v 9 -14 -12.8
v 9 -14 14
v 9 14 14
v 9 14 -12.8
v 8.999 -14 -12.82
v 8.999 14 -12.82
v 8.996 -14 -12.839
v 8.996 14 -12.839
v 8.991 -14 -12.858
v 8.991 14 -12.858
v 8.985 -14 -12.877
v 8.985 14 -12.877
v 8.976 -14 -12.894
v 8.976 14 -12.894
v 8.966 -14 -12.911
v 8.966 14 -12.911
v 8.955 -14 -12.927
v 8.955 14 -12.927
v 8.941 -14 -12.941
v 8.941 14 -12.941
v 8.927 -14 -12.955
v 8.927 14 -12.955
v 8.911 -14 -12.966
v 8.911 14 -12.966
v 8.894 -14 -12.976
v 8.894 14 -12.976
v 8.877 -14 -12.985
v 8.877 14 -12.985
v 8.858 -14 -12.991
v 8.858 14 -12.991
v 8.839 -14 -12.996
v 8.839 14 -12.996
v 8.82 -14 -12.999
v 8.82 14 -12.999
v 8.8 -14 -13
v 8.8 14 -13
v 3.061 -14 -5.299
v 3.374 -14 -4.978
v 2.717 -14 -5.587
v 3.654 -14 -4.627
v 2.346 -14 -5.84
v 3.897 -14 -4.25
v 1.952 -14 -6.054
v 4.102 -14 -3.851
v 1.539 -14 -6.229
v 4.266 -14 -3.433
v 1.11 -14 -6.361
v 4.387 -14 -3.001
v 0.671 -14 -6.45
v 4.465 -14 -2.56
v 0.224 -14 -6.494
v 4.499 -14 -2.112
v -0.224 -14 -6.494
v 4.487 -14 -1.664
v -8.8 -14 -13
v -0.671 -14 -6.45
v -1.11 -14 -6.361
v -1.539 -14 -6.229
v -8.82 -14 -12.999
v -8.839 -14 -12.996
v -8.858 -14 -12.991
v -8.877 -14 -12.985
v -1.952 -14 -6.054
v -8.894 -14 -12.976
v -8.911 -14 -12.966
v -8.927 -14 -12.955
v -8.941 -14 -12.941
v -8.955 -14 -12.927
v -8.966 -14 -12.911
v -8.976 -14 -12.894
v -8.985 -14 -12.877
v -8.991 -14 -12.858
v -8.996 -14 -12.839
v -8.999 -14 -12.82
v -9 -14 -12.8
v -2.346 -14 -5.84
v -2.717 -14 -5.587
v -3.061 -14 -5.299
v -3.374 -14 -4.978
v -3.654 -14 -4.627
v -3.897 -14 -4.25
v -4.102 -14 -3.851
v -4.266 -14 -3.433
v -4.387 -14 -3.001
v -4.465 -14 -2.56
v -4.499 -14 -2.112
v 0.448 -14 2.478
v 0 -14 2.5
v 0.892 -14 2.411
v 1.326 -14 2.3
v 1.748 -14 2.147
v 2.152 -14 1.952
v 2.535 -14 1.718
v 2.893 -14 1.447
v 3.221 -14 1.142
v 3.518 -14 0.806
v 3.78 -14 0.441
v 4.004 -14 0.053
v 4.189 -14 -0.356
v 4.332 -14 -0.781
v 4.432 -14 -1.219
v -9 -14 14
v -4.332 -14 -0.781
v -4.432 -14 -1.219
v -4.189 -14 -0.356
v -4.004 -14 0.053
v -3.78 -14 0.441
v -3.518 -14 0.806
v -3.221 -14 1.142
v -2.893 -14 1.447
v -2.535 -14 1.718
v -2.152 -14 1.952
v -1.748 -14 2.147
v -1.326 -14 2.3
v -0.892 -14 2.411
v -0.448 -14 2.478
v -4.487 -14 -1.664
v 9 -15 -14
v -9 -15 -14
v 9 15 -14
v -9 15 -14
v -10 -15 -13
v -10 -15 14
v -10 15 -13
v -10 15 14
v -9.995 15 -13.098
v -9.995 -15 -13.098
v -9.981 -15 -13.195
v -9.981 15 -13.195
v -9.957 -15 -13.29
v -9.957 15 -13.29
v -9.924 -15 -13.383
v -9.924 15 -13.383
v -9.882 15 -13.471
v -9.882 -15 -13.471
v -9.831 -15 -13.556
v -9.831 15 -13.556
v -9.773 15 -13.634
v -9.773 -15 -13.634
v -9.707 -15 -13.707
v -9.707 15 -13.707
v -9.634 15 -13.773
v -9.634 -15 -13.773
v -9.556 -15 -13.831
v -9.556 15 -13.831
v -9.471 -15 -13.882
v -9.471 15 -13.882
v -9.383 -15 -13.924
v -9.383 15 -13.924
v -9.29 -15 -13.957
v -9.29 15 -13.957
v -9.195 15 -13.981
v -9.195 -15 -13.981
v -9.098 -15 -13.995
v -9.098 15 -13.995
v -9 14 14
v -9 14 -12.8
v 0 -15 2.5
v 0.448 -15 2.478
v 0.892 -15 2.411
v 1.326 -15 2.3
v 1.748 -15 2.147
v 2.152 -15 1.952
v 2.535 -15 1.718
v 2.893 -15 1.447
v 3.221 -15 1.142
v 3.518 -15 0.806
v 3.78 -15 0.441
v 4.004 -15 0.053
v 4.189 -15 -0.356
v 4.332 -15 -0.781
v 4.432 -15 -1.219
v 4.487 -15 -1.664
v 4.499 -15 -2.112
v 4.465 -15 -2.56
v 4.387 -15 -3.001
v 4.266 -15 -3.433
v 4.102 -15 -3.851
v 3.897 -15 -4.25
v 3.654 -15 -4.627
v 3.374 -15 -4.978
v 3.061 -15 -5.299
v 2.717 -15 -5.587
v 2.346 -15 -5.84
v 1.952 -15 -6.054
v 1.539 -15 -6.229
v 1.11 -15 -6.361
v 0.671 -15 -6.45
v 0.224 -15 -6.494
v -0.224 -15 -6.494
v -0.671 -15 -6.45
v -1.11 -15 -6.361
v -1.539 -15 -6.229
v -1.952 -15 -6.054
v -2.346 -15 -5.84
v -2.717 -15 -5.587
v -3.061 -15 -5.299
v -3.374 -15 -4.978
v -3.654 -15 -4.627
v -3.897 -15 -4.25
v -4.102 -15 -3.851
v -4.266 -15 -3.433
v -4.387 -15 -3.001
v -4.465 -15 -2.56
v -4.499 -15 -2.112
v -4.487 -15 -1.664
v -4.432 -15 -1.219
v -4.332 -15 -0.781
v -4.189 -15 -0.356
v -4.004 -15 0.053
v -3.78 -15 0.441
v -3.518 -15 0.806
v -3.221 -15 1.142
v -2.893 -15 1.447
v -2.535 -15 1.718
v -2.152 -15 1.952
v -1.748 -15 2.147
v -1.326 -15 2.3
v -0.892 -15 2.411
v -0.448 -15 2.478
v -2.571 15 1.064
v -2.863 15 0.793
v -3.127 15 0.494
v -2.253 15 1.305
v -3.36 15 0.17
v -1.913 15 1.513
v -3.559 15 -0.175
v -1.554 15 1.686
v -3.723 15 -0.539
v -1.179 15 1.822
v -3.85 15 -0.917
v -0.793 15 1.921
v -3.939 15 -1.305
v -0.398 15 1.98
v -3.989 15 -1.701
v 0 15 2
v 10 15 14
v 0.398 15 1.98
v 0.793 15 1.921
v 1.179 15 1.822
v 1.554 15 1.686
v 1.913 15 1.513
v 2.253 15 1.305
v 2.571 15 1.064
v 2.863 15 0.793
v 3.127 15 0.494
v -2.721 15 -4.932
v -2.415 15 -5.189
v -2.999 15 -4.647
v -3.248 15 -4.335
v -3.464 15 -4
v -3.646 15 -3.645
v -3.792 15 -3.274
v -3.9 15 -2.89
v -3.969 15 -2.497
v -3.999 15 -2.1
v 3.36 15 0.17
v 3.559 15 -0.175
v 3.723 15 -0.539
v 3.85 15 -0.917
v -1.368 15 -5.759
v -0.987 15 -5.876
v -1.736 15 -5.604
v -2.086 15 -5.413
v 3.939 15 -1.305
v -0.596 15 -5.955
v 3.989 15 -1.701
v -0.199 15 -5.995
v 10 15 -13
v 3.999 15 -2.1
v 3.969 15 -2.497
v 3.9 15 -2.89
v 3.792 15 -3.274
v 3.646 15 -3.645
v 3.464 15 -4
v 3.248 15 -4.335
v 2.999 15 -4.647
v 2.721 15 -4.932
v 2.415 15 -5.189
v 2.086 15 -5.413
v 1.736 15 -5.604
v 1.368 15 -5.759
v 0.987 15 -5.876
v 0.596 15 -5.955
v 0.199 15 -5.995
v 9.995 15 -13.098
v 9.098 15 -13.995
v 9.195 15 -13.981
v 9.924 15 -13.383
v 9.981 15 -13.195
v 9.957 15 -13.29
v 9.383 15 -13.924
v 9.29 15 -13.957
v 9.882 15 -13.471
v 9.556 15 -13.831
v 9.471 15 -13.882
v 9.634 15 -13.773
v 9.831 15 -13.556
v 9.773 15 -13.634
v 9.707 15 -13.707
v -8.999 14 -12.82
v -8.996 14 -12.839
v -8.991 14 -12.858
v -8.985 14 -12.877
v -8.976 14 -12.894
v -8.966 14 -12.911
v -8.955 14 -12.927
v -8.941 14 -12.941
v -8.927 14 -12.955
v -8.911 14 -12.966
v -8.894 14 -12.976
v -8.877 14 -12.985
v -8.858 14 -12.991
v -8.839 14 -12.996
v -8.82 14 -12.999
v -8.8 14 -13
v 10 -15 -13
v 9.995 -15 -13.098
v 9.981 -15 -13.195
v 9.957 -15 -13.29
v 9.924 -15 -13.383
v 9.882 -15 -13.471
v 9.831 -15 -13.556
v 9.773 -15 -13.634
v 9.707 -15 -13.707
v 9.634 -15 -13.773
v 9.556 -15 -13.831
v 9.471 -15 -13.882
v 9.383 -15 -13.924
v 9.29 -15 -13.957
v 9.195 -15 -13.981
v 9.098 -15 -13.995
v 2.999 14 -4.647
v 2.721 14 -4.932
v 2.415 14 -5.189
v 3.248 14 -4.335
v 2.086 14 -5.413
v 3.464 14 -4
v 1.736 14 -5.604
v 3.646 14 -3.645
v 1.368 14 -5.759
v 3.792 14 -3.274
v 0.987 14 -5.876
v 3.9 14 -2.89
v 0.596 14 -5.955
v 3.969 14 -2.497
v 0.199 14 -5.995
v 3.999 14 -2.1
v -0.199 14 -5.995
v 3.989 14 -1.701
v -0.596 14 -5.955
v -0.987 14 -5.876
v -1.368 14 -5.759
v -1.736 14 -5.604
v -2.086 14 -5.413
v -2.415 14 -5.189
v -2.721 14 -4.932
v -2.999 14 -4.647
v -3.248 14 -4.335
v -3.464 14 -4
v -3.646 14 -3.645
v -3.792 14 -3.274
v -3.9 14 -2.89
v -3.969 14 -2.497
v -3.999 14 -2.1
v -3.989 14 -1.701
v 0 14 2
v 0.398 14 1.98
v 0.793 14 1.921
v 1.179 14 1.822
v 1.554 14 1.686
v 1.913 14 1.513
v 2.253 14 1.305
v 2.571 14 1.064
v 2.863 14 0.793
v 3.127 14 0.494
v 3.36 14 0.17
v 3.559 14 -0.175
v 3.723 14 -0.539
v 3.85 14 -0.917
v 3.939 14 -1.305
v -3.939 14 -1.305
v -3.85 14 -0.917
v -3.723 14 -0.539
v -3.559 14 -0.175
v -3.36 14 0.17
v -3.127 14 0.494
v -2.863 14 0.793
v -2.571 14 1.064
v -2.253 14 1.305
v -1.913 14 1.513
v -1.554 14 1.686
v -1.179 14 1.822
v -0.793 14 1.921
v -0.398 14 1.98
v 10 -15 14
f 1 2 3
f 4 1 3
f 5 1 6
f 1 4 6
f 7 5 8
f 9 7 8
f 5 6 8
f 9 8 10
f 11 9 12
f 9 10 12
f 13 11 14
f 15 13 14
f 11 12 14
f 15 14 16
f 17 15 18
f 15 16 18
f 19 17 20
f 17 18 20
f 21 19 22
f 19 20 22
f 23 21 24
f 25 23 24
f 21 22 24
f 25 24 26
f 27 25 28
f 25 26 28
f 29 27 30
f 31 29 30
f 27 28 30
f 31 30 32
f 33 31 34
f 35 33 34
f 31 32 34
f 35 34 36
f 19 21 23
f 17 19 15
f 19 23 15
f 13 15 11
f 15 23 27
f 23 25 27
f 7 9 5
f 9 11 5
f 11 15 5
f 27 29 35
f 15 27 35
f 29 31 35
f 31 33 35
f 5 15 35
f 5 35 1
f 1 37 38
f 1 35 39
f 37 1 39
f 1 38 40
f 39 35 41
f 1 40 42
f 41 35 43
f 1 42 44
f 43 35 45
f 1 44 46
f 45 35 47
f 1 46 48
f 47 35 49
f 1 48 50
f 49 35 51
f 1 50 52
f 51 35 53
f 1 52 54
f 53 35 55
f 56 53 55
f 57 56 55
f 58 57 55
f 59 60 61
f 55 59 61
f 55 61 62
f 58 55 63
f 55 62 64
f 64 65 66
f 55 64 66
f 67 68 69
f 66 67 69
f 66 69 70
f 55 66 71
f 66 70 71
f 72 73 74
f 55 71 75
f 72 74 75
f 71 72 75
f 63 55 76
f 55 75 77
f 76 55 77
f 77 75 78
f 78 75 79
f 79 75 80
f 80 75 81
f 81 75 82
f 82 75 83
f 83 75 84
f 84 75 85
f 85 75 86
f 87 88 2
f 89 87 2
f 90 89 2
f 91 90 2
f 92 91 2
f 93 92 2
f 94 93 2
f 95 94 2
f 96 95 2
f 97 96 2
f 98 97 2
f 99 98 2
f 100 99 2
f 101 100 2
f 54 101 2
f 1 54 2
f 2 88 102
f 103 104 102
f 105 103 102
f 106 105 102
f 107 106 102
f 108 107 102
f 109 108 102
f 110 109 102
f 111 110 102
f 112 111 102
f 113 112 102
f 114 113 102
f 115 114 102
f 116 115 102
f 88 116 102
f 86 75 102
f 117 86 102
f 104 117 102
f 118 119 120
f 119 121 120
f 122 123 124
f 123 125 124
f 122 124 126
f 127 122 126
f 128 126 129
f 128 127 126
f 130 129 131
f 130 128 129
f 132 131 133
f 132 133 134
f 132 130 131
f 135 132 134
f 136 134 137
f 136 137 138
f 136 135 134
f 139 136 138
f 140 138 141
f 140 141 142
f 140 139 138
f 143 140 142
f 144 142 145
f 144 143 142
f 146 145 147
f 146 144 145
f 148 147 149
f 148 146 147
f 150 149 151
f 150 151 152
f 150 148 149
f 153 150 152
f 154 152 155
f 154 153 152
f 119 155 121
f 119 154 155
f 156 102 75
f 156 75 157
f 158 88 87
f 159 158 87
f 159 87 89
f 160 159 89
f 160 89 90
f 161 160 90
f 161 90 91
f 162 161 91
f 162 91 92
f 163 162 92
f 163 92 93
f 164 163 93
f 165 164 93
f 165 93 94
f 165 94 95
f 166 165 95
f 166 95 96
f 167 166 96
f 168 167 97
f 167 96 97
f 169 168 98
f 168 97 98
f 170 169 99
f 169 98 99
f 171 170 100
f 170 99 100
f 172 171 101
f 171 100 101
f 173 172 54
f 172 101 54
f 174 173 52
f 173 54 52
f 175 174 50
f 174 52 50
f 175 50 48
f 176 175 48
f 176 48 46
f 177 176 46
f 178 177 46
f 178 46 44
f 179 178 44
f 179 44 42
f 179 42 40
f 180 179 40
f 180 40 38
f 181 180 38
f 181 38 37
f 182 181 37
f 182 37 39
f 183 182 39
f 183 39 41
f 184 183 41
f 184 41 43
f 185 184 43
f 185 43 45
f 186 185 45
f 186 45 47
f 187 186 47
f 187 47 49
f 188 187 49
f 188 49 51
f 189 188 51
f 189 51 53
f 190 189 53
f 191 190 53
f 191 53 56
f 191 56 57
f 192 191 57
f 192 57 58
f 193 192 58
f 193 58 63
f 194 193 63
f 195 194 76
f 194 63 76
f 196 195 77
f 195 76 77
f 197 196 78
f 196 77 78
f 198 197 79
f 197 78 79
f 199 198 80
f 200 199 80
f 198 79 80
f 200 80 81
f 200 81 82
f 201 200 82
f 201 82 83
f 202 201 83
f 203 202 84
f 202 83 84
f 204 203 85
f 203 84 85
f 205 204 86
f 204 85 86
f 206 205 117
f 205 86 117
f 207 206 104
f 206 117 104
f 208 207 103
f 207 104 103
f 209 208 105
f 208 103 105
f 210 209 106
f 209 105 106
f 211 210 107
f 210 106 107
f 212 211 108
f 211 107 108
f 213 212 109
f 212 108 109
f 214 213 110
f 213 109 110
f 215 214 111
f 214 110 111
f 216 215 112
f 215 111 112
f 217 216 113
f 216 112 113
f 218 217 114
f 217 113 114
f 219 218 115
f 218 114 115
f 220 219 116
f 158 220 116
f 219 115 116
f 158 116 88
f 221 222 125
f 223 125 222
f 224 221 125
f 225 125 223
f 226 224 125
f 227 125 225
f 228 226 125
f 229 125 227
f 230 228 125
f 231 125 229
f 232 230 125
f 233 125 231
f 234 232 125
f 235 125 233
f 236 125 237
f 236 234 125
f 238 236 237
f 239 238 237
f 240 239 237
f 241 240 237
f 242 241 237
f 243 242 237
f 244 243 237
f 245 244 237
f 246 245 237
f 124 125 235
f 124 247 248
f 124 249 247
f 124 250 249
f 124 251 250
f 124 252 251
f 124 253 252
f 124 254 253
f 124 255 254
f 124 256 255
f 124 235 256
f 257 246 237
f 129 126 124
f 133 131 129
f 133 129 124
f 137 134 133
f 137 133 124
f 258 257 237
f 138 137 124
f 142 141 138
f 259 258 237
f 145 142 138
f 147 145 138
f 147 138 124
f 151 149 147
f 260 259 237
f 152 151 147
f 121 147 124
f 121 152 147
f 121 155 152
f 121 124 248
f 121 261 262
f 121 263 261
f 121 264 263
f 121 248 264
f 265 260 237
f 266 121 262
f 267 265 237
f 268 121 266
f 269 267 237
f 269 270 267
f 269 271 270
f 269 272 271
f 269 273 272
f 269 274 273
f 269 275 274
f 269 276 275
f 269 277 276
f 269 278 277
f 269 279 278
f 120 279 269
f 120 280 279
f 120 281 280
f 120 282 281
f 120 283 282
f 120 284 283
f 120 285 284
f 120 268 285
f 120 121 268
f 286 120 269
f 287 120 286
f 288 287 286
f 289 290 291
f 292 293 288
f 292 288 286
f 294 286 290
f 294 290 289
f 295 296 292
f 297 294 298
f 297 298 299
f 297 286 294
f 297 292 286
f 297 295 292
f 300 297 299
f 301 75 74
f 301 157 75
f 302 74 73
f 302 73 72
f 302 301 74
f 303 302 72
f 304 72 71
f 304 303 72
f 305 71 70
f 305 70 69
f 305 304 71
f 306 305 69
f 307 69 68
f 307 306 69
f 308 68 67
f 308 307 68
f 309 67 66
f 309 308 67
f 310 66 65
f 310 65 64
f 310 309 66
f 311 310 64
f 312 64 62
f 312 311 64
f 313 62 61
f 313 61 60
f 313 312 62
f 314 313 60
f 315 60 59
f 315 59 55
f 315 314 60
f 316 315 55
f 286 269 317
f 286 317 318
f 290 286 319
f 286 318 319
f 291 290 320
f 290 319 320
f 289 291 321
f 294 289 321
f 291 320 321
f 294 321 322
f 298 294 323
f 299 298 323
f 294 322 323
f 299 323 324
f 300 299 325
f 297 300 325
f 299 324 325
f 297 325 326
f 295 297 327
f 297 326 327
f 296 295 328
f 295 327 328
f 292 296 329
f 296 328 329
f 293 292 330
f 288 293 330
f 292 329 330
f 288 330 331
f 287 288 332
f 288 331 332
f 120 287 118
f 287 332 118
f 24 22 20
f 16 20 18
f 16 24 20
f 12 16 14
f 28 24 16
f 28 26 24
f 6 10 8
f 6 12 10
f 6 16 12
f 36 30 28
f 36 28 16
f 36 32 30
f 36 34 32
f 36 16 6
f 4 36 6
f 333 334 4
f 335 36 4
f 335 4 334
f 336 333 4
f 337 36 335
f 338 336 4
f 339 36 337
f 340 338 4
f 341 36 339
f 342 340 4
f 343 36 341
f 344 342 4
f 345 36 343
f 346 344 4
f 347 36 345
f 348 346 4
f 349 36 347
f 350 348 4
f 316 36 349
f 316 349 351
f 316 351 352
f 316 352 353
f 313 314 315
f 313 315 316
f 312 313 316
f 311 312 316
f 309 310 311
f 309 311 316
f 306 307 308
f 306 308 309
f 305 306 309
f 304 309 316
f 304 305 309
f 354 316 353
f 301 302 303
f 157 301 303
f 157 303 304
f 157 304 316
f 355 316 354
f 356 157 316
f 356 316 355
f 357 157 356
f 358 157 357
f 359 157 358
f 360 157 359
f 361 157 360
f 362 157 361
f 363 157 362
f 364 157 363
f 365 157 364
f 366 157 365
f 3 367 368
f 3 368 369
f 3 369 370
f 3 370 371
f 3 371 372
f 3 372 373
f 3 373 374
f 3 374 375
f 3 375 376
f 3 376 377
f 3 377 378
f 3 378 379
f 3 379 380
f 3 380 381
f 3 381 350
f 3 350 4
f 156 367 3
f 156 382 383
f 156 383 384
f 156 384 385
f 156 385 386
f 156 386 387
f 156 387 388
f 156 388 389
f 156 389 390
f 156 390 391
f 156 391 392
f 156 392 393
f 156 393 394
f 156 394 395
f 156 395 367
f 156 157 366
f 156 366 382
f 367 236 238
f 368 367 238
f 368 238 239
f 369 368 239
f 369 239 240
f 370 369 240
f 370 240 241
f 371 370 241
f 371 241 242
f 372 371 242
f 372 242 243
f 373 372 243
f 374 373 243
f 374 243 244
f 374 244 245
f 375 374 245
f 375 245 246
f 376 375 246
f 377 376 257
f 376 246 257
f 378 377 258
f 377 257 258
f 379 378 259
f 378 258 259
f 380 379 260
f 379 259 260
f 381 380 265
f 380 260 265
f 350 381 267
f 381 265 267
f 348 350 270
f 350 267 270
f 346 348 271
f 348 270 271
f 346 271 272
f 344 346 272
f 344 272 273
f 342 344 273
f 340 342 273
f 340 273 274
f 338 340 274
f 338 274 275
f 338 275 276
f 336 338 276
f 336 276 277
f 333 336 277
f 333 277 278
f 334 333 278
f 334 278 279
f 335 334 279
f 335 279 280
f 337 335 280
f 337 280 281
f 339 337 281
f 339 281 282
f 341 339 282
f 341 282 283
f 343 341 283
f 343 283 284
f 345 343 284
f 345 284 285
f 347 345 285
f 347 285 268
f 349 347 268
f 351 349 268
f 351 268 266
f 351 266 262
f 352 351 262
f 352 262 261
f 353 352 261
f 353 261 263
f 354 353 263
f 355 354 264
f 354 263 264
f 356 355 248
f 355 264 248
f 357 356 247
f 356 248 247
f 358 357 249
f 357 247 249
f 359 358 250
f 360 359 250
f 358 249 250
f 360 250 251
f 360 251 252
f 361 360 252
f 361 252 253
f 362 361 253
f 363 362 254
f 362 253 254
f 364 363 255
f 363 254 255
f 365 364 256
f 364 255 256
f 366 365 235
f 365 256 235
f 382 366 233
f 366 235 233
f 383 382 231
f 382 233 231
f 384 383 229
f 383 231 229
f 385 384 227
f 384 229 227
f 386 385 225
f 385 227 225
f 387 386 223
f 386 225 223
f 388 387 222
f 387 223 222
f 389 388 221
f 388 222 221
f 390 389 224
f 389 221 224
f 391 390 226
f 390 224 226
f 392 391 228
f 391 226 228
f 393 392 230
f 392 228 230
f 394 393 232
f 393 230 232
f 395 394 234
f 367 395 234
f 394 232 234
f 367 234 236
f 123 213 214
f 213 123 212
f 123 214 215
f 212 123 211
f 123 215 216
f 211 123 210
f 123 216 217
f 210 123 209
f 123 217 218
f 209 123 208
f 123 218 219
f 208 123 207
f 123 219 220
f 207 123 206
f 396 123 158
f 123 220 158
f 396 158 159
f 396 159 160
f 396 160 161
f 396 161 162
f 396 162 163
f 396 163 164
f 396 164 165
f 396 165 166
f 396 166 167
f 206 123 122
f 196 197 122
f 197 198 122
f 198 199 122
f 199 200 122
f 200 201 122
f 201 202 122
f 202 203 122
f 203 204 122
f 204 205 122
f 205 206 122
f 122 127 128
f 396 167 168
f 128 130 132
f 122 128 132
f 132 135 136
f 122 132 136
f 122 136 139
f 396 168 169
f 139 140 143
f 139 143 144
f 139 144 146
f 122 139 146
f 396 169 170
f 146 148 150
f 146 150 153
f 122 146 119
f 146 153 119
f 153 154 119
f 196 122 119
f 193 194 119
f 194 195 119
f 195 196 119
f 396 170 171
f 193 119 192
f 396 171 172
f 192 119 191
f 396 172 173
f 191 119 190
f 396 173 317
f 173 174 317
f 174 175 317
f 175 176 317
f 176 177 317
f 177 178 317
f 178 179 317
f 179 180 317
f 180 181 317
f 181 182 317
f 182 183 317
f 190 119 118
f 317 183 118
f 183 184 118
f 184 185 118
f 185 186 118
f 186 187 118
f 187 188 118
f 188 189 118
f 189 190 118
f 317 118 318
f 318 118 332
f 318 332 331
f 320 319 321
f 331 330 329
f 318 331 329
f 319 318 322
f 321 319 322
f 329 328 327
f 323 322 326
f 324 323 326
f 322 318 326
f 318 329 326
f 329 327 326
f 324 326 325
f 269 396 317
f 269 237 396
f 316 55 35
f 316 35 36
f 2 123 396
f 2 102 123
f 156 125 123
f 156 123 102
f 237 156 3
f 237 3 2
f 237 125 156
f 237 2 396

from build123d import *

# Parameters (mm, degrees)
MAINBODYS_W        = 20
MAINBODYS_H        = 28
MAIN_BODY_DEPTH    = 15
MB_FILLET_R        = 1
SHELL_START        = -9
SHELL_MB_OUTLINE_W = 28
SHELL_MB_OUTLINE_H = 27
SHELL_MB_DEPTH     = 18
TOP_BORE_REACH     = 36.583
TOPBORES_R         = 4
BOTTOMBORES_R      = 4.5
BOTTOM_BORE_DEPTH  = 34.7194306
MB_INNER_FILLET_R  = 0.2


# Read off the part's stored shape, not the designer's step: SHELL MB
with BuildPart() as part:
    # MainBodyS → MAIN BODY (new, symmetric)
    with BuildSketch(Plane(origin=(0, 0, 0), x_dir=(1, 0, 0), z_dir=(0, 1, 0))):
        Rectangle(MAINBODYS_W, MAINBODYS_H)
    extrude(amount=MAIN_BODY_DEPTH, both=True)

    # MB FILLET
    mb_fillet_edges = [part.edges().sort_by_distance(p)[0] for p in [
        (-10, 0, -14),
        (10, 0, -14),
    ]]
    fillet(mb_fillet_edges, radius=MB_FILLET_R)

    # SHELL MB outline → SHELL MB (cut)
    with BuildSketch(Plane.YZ.offset(SHELL_START)):
        with Locations((0, 0.5)):
            Rectangle(SHELL_MB_OUTLINE_W, SHELL_MB_OUTLINE_H)
    extrude(amount=SHELL_MB_DEPTH, mode=Mode.SUBTRACT)

    # TopBoreS → TOP BORE (cut, up to next)
    with BuildSketch(Plane(origin=(0, 15, 0), x_dir=(1, 0, 0), z_dir=(0, 1, 0)), mode=Mode.PRIVATE) as top_bore_sk1:
        with Locations(Location((0, 2, 0), (0, 0, 270))):
            Circle(TOPBORES_R)
    top_bore_tool1 = extrude(top_bore_sk1.sketch, amount=-TOP_BORE_REACH, mode=Mode.PRIVATE) & part.part
    add(top_bore_tool1.solids().sort_by_distance((0, 15, -2))[0], mode=Mode.SUBTRACT)

    # BottomBoreS → BOTTOM BORE (cut, through all)
    with BuildSketch(Plane(origin=(0, -14, 0), x_dir=(1, 0, 0), z_dir=(0, 1, 0))):
        with Locations(Location((0, 2, 0), (0, 0, 270))):
            Circle(BOTTOMBORES_R)
    extrude(amount=-BOTTOM_BORE_DEPTH, mode=Mode.SUBTRACT)

    # MB INNER FILLET
    mb_inner_fillet_edges = [part.edges().sort_by_distance(p)[0] for p in [
        (9, 0, -13),
        (-9, 0, -13),
    ]]
    fillet(mb_inner_fillet_edges, radius=MB_INNER_FILLET_R)


solid = part.part
